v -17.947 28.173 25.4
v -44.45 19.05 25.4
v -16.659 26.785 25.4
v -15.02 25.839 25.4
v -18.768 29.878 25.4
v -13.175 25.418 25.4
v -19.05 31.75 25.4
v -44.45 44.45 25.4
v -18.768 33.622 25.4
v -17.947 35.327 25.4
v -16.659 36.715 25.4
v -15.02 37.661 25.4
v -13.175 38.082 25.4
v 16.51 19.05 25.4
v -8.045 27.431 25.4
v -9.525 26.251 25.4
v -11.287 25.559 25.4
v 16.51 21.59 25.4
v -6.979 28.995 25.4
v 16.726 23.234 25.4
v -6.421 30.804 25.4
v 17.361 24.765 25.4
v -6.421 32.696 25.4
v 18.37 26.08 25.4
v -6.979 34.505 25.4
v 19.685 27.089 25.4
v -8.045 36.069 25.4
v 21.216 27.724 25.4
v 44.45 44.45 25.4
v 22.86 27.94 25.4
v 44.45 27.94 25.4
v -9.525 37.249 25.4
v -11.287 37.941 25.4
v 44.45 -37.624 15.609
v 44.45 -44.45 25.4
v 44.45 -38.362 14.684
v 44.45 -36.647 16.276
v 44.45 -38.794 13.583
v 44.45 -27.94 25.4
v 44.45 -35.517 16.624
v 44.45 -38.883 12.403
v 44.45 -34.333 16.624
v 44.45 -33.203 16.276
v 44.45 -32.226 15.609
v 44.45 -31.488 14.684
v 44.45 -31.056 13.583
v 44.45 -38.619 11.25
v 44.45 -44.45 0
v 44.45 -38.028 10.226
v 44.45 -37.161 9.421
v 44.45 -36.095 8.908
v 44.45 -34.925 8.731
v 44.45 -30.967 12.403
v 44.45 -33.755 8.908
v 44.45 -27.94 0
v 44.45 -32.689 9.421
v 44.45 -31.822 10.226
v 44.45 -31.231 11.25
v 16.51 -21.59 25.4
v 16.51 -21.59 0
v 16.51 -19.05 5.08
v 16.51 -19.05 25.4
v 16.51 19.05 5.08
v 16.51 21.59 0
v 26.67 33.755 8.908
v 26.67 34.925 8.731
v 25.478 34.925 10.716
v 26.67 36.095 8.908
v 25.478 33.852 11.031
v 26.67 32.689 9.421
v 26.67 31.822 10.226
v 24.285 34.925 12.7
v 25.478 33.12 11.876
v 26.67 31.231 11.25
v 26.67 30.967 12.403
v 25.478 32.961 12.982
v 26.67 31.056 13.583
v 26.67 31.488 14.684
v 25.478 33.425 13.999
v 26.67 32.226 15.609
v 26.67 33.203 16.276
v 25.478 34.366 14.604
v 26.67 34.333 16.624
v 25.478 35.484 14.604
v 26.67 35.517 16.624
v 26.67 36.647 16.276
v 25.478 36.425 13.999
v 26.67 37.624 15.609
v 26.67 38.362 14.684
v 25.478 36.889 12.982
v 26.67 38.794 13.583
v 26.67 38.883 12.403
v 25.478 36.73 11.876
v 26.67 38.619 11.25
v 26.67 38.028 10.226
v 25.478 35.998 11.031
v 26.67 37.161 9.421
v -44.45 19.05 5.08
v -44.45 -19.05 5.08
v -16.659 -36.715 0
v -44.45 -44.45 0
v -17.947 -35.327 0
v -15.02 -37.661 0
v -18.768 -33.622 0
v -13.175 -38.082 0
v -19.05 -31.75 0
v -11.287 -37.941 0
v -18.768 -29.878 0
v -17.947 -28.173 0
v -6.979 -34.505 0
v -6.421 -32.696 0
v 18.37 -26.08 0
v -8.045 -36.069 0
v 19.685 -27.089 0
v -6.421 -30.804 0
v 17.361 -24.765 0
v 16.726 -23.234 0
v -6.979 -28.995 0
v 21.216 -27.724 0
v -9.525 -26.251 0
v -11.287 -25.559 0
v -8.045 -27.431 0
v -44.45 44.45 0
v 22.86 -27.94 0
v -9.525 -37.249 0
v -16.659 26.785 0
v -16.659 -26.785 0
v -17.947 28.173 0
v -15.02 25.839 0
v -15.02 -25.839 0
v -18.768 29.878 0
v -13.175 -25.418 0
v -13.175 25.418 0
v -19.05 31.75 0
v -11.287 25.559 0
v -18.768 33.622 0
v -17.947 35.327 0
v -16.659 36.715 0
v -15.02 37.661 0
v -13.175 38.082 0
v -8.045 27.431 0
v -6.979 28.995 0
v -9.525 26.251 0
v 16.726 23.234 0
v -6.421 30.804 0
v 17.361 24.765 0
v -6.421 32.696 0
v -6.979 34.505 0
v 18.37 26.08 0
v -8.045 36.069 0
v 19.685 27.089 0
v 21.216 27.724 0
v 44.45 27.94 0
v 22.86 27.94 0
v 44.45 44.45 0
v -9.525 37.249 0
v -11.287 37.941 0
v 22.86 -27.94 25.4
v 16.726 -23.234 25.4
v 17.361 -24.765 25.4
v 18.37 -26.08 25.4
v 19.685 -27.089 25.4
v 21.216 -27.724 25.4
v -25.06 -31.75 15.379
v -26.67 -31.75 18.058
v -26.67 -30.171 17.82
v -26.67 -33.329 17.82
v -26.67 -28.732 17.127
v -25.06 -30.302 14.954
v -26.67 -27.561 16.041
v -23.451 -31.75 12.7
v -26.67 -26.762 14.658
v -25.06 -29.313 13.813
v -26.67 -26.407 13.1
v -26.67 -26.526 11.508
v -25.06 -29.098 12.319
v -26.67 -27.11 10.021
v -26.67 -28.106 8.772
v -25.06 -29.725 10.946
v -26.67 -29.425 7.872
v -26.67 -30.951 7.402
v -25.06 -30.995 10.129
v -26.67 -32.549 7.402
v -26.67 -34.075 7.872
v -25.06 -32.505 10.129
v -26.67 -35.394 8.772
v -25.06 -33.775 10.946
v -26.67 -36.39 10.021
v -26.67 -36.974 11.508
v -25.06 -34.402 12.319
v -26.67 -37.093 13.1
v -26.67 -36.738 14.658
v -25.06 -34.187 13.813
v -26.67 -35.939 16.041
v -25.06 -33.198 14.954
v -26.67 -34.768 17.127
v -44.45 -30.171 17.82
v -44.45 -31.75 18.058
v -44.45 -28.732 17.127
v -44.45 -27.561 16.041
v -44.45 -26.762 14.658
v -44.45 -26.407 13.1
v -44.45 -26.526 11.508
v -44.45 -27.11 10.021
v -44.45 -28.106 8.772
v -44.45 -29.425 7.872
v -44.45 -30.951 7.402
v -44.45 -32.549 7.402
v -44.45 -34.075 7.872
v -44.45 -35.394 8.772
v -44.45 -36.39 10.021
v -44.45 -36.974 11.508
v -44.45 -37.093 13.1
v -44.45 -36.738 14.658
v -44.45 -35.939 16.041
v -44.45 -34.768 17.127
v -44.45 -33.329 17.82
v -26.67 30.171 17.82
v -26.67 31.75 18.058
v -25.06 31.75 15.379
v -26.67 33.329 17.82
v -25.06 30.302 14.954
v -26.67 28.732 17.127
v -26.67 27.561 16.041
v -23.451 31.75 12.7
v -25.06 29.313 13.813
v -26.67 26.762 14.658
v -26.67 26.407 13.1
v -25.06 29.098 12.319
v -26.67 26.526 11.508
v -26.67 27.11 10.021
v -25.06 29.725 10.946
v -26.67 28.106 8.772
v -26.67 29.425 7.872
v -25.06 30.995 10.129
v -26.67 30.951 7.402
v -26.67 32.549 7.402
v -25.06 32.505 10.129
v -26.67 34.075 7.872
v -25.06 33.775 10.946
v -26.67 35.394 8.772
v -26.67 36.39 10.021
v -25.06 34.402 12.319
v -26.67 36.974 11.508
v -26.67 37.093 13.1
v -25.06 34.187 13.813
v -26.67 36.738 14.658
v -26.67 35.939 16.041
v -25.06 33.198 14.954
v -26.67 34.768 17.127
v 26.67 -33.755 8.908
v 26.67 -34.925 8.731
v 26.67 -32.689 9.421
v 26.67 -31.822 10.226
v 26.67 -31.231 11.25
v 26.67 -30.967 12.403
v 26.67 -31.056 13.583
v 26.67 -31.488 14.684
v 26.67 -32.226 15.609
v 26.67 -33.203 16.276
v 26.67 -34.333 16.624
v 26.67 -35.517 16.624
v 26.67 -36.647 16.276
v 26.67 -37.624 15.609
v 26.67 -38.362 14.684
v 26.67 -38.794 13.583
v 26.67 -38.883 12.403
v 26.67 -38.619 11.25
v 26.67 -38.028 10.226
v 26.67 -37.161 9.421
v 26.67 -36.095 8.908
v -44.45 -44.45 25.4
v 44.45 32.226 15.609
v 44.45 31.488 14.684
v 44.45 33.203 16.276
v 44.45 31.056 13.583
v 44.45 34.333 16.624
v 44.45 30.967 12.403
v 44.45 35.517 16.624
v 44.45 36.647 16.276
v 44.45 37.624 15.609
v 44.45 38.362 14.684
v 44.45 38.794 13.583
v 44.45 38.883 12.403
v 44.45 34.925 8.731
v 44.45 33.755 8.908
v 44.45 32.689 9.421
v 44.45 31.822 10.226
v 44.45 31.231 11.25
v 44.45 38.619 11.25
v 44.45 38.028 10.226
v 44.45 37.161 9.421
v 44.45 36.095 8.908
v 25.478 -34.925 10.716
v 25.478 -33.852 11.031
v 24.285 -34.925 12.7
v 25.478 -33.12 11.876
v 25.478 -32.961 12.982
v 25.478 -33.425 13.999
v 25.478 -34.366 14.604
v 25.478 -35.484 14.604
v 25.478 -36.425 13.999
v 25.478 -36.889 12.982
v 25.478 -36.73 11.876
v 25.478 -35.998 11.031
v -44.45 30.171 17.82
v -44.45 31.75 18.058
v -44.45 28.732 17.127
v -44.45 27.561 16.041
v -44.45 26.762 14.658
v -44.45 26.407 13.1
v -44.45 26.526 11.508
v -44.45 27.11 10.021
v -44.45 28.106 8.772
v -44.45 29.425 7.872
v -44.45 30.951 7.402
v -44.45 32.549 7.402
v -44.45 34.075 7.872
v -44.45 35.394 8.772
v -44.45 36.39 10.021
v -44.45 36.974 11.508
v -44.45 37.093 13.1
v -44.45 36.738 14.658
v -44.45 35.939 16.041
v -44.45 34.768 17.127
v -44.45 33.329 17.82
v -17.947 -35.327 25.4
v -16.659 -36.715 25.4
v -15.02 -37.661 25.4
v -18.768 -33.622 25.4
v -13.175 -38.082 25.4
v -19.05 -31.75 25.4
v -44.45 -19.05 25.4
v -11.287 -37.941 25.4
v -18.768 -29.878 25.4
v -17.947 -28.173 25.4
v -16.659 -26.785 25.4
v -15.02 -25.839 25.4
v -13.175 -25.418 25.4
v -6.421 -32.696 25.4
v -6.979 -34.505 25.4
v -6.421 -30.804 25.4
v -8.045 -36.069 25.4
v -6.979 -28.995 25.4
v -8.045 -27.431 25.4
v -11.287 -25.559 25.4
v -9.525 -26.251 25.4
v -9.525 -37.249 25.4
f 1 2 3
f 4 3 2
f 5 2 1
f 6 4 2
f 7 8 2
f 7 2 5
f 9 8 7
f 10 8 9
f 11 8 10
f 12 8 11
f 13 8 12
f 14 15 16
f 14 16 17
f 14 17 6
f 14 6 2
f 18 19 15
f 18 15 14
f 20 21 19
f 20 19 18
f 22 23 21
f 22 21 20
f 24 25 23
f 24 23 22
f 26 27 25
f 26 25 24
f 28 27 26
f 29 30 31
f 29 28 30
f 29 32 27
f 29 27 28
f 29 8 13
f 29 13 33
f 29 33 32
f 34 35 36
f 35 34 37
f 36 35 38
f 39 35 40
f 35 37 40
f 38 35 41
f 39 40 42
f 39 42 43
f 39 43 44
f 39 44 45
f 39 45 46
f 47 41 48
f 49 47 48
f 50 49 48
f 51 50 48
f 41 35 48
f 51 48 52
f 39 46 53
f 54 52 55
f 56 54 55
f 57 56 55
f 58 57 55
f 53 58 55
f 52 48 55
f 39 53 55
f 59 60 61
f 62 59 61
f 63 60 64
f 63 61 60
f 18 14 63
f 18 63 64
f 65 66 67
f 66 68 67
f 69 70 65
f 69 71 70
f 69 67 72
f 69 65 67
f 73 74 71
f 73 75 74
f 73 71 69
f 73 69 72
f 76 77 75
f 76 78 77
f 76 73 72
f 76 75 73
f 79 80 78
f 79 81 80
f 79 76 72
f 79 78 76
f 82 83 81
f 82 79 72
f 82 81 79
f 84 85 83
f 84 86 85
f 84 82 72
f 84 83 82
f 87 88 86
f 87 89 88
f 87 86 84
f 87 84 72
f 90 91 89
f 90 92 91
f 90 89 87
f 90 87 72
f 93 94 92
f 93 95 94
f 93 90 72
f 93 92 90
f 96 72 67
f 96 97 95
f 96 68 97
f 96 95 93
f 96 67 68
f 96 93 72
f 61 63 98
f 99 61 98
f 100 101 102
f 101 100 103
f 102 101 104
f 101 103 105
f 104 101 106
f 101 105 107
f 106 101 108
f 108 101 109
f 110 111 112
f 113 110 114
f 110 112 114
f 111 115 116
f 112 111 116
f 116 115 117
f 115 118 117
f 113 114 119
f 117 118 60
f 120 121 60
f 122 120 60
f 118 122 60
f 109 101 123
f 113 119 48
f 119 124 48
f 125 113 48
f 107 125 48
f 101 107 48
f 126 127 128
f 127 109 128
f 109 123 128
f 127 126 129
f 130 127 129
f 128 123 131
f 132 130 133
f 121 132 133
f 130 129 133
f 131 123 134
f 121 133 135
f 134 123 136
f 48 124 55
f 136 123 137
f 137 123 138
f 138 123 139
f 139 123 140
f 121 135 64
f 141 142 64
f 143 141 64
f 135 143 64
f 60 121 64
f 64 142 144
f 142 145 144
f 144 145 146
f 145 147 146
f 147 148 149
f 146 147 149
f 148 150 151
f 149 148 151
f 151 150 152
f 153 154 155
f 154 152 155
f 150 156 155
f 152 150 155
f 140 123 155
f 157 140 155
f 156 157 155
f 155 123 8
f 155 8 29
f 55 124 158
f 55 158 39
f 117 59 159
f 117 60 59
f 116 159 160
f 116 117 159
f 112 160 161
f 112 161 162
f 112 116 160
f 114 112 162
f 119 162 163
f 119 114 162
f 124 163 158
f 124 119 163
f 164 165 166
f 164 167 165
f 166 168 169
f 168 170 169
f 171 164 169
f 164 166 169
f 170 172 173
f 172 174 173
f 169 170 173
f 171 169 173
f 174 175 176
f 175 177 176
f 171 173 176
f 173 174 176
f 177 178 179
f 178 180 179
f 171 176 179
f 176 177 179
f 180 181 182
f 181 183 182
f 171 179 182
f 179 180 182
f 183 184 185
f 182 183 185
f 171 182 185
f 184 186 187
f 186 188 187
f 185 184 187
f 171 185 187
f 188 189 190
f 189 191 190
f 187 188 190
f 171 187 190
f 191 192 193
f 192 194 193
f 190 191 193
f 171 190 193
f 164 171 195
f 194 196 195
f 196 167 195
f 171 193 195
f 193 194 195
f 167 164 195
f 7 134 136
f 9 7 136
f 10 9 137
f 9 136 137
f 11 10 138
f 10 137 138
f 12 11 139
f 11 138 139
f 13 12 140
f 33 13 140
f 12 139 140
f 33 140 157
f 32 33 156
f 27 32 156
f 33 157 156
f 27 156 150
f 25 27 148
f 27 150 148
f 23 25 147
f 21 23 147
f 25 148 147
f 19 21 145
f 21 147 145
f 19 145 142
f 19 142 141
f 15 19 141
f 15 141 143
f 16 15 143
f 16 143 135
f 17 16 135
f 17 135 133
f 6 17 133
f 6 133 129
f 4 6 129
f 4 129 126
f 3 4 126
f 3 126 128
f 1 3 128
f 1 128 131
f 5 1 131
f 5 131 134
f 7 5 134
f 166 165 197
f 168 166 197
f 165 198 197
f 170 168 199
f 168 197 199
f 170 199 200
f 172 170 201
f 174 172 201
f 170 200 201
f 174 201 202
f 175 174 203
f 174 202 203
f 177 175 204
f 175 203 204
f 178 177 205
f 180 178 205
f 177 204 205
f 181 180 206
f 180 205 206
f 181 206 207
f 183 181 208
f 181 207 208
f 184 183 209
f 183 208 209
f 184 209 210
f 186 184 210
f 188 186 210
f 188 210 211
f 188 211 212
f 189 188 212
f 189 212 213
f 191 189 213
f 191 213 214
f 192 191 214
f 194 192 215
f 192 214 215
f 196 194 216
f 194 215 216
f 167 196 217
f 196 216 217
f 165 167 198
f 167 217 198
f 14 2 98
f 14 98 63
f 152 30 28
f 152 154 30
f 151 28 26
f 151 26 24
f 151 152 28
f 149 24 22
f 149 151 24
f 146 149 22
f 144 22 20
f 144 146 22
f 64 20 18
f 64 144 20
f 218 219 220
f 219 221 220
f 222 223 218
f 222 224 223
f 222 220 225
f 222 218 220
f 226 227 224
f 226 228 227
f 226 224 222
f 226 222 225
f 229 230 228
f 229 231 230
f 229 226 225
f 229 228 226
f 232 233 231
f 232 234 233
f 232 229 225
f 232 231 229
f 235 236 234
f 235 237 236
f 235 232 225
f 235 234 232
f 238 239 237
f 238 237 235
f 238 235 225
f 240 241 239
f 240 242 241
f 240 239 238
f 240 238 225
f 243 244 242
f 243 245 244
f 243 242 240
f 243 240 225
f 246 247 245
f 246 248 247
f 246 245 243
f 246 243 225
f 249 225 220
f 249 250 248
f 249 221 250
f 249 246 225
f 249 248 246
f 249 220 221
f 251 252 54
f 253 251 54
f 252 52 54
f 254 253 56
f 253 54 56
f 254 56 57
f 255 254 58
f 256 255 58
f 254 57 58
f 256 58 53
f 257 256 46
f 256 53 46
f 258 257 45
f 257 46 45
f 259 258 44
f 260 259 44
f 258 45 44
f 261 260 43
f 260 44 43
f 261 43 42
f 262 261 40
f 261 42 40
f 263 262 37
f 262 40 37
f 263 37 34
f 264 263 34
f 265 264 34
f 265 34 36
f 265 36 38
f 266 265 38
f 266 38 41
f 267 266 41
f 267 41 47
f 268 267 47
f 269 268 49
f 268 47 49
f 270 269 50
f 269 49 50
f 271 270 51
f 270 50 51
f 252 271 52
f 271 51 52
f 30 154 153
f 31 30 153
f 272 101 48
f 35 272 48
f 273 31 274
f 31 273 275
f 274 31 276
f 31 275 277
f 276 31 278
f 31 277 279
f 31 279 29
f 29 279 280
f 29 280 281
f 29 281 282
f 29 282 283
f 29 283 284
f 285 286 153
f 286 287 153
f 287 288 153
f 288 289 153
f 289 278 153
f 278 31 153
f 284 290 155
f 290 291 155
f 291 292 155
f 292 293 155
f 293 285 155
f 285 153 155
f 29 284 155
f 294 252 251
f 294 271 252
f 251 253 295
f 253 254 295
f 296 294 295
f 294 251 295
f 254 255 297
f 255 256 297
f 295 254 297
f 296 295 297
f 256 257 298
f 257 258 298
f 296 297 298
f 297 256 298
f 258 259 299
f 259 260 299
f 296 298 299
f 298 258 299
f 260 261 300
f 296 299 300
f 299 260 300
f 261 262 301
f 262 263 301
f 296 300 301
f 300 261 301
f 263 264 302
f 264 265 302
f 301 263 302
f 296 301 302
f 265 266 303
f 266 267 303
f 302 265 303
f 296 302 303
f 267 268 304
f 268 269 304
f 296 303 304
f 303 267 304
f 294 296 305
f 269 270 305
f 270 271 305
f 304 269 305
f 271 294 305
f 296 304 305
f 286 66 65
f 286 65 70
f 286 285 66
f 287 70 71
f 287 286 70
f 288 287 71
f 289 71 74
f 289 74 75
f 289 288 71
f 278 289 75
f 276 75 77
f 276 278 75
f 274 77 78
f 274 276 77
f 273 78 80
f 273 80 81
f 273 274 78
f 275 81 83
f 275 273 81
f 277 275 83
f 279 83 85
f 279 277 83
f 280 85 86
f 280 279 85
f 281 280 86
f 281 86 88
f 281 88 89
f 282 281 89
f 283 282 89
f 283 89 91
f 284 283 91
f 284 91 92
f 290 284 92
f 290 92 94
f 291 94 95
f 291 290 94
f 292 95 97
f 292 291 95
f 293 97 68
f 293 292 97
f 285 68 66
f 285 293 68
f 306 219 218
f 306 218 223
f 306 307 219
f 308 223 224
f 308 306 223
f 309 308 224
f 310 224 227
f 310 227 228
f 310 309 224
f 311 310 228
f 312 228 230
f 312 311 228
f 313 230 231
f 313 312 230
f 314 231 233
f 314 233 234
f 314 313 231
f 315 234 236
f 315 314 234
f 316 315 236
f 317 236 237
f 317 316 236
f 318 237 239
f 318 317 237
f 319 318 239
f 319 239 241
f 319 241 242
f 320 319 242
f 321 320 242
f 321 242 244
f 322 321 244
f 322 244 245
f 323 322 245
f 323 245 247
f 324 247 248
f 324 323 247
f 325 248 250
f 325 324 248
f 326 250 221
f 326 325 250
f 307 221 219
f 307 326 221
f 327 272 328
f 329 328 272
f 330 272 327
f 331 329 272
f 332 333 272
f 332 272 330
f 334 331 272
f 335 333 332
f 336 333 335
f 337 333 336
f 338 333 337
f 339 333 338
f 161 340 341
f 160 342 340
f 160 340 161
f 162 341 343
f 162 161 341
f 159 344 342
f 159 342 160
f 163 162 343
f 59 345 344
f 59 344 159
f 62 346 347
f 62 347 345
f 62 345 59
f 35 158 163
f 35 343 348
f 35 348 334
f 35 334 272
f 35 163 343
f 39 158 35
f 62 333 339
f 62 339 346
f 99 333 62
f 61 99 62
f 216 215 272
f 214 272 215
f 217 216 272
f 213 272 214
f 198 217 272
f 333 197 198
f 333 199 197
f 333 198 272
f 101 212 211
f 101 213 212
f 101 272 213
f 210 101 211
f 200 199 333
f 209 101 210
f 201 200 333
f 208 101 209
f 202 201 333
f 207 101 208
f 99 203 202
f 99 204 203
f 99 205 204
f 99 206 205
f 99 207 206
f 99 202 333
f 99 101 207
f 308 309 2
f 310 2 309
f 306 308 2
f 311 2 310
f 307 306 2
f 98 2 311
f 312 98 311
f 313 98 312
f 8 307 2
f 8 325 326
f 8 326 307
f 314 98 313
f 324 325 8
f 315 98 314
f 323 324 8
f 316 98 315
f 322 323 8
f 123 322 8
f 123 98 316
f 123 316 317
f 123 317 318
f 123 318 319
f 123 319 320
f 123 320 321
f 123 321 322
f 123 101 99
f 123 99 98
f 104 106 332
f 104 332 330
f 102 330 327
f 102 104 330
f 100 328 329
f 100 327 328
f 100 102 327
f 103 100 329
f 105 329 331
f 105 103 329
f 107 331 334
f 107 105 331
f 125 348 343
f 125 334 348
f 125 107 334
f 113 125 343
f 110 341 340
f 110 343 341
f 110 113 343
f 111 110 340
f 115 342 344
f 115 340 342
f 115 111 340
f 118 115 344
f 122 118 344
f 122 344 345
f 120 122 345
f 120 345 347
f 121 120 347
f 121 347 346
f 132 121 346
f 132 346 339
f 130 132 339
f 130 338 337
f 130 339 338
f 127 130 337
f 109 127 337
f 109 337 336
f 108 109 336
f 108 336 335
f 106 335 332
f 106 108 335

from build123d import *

# Parameters (mm, degrees)
SKETCH1_W                  = 88.9
SKETCH1_H                  = 88.9
EXTRUDE1_DEPTH             = 25.4
F_1_2_0_5_DIAMETER_HOLE1_D = 12.7
EXTRUDE5_DEPTH             = 20.32
SKETCH16_W                 = 27.94
SKETCH16_H                 = 55.88
EXTRUDE6_DEPTH             = 6.08
FILLET2_R                  = 6.35


with BuildPart() as part:
    # Sketch1 → Extrude1 (new body)
    with BuildSketch(Plane.XY):
        Rectangle(SKETCH1_W, SKETCH1_H)
    extrude(amount=EXTRUDE1_DEPTH)

    # Sketch3 → Tap Drill for 3/8-16 Tap2 (revolve, cut)
    with BuildSketch(Plane(origin=(44.45, 34.925, 12.7), x_dir=(0, 0, -1), z_dir=(0, 1, 0))):
        Polygon((0, 0), (0, 20.164665582), (3.96875, 17.78), (3.96875, 0), align=None)
    tap_drill_for_3_8_16_tap2 = revolve(axis=Axis((50.8, 34.925, 12.7), (-1, 0, 0)), mode=Mode.SUBTRACT)

    # Mirror1: Tap Drill for 3/8-16 Tap2 across plane
    add(tap_drill_for_3_8_16_tap2.mirror(Plane.ZX), mode=Mode.SUBTRACT)

    # 1/2 (0.5) Diameter Hole1 (through all)
    with Locations(Plane.XY.offset(25.4)):
        with Locations((-12.7, 31.75)):
            f_1_2_0_5_diameter_hole1 = Hole(F_1_2_0_5_DIAMETER_HOLE1_D / 2)

    # Mirror3: 1/2 (0.5) Diameter Hole1 across plane
    add(f_1_2_0_5_diameter_hole1.mirror(Plane.ZX), mode=Mode.SUBTRACT)

    # Sketch15 → Extrude5 (cut)
    with BuildSketch(Plane.XY.offset(25.4)):
        Polygon((-44.45, 0), (-44.45, 19.05), (16.51, 19.05), (16.51, 27.94), (44.45, 27.94), (44.45, 0), align=None)
    extrude5 = extrude(amount=-EXTRUDE5_DEPTH, mode=Mode.SUBTRACT)

    # Mirror4: Extrude5 across plane
    add(extrude5.mirror(Plane.ZX), mode=Mode.SUBTRACT)

    # Sketch16 → Extrude6 (cut, through all)
    with BuildSketch(Plane.XY.offset(5.08)):
        with Locations((30.48, 0)):
            Rectangle(SKETCH16_W, SKETCH16_H)
    extrude(amount=-EXTRUDE6_DEPTH, mode=Mode.SUBTRACT)

    # Fillet2
    fillet2_edges = [part.edges().sort_by_distance(p)[0] for p in [
        (16.51, 27.94, 12.7),
        (16.51, -27.94, 12.7),
    ]]
    fillet(fillet2_edges, radius=FILLET2_R)

    # Sketch18 → Tap Drill for 1/2-13 Tap2 (revolve, cut)
    with BuildSketch(Plane(origin=(-44.45, 31.75, 12.7), x_dir=(0, 0, 1), z_dir=(0, 1, 0))):
        Polygon((0, 0), (0, 20.999489309), (5.35813, 17.78), (5.35813, 0), align=None)
    tap_drill_for_1_2_13_tap2 = revolve(axis=Axis((-50.8, 31.75, 12.7), (1, 0, 0)), mode=Mode.SUBTRACT)

    # Mirror5: Tap Drill for 1/2-13 Tap2 across plane
    add(tap_drill_for_1_2_13_tap2.mirror(Plane.ZX), mode=Mode.SUBTRACT)


solid = part.part
